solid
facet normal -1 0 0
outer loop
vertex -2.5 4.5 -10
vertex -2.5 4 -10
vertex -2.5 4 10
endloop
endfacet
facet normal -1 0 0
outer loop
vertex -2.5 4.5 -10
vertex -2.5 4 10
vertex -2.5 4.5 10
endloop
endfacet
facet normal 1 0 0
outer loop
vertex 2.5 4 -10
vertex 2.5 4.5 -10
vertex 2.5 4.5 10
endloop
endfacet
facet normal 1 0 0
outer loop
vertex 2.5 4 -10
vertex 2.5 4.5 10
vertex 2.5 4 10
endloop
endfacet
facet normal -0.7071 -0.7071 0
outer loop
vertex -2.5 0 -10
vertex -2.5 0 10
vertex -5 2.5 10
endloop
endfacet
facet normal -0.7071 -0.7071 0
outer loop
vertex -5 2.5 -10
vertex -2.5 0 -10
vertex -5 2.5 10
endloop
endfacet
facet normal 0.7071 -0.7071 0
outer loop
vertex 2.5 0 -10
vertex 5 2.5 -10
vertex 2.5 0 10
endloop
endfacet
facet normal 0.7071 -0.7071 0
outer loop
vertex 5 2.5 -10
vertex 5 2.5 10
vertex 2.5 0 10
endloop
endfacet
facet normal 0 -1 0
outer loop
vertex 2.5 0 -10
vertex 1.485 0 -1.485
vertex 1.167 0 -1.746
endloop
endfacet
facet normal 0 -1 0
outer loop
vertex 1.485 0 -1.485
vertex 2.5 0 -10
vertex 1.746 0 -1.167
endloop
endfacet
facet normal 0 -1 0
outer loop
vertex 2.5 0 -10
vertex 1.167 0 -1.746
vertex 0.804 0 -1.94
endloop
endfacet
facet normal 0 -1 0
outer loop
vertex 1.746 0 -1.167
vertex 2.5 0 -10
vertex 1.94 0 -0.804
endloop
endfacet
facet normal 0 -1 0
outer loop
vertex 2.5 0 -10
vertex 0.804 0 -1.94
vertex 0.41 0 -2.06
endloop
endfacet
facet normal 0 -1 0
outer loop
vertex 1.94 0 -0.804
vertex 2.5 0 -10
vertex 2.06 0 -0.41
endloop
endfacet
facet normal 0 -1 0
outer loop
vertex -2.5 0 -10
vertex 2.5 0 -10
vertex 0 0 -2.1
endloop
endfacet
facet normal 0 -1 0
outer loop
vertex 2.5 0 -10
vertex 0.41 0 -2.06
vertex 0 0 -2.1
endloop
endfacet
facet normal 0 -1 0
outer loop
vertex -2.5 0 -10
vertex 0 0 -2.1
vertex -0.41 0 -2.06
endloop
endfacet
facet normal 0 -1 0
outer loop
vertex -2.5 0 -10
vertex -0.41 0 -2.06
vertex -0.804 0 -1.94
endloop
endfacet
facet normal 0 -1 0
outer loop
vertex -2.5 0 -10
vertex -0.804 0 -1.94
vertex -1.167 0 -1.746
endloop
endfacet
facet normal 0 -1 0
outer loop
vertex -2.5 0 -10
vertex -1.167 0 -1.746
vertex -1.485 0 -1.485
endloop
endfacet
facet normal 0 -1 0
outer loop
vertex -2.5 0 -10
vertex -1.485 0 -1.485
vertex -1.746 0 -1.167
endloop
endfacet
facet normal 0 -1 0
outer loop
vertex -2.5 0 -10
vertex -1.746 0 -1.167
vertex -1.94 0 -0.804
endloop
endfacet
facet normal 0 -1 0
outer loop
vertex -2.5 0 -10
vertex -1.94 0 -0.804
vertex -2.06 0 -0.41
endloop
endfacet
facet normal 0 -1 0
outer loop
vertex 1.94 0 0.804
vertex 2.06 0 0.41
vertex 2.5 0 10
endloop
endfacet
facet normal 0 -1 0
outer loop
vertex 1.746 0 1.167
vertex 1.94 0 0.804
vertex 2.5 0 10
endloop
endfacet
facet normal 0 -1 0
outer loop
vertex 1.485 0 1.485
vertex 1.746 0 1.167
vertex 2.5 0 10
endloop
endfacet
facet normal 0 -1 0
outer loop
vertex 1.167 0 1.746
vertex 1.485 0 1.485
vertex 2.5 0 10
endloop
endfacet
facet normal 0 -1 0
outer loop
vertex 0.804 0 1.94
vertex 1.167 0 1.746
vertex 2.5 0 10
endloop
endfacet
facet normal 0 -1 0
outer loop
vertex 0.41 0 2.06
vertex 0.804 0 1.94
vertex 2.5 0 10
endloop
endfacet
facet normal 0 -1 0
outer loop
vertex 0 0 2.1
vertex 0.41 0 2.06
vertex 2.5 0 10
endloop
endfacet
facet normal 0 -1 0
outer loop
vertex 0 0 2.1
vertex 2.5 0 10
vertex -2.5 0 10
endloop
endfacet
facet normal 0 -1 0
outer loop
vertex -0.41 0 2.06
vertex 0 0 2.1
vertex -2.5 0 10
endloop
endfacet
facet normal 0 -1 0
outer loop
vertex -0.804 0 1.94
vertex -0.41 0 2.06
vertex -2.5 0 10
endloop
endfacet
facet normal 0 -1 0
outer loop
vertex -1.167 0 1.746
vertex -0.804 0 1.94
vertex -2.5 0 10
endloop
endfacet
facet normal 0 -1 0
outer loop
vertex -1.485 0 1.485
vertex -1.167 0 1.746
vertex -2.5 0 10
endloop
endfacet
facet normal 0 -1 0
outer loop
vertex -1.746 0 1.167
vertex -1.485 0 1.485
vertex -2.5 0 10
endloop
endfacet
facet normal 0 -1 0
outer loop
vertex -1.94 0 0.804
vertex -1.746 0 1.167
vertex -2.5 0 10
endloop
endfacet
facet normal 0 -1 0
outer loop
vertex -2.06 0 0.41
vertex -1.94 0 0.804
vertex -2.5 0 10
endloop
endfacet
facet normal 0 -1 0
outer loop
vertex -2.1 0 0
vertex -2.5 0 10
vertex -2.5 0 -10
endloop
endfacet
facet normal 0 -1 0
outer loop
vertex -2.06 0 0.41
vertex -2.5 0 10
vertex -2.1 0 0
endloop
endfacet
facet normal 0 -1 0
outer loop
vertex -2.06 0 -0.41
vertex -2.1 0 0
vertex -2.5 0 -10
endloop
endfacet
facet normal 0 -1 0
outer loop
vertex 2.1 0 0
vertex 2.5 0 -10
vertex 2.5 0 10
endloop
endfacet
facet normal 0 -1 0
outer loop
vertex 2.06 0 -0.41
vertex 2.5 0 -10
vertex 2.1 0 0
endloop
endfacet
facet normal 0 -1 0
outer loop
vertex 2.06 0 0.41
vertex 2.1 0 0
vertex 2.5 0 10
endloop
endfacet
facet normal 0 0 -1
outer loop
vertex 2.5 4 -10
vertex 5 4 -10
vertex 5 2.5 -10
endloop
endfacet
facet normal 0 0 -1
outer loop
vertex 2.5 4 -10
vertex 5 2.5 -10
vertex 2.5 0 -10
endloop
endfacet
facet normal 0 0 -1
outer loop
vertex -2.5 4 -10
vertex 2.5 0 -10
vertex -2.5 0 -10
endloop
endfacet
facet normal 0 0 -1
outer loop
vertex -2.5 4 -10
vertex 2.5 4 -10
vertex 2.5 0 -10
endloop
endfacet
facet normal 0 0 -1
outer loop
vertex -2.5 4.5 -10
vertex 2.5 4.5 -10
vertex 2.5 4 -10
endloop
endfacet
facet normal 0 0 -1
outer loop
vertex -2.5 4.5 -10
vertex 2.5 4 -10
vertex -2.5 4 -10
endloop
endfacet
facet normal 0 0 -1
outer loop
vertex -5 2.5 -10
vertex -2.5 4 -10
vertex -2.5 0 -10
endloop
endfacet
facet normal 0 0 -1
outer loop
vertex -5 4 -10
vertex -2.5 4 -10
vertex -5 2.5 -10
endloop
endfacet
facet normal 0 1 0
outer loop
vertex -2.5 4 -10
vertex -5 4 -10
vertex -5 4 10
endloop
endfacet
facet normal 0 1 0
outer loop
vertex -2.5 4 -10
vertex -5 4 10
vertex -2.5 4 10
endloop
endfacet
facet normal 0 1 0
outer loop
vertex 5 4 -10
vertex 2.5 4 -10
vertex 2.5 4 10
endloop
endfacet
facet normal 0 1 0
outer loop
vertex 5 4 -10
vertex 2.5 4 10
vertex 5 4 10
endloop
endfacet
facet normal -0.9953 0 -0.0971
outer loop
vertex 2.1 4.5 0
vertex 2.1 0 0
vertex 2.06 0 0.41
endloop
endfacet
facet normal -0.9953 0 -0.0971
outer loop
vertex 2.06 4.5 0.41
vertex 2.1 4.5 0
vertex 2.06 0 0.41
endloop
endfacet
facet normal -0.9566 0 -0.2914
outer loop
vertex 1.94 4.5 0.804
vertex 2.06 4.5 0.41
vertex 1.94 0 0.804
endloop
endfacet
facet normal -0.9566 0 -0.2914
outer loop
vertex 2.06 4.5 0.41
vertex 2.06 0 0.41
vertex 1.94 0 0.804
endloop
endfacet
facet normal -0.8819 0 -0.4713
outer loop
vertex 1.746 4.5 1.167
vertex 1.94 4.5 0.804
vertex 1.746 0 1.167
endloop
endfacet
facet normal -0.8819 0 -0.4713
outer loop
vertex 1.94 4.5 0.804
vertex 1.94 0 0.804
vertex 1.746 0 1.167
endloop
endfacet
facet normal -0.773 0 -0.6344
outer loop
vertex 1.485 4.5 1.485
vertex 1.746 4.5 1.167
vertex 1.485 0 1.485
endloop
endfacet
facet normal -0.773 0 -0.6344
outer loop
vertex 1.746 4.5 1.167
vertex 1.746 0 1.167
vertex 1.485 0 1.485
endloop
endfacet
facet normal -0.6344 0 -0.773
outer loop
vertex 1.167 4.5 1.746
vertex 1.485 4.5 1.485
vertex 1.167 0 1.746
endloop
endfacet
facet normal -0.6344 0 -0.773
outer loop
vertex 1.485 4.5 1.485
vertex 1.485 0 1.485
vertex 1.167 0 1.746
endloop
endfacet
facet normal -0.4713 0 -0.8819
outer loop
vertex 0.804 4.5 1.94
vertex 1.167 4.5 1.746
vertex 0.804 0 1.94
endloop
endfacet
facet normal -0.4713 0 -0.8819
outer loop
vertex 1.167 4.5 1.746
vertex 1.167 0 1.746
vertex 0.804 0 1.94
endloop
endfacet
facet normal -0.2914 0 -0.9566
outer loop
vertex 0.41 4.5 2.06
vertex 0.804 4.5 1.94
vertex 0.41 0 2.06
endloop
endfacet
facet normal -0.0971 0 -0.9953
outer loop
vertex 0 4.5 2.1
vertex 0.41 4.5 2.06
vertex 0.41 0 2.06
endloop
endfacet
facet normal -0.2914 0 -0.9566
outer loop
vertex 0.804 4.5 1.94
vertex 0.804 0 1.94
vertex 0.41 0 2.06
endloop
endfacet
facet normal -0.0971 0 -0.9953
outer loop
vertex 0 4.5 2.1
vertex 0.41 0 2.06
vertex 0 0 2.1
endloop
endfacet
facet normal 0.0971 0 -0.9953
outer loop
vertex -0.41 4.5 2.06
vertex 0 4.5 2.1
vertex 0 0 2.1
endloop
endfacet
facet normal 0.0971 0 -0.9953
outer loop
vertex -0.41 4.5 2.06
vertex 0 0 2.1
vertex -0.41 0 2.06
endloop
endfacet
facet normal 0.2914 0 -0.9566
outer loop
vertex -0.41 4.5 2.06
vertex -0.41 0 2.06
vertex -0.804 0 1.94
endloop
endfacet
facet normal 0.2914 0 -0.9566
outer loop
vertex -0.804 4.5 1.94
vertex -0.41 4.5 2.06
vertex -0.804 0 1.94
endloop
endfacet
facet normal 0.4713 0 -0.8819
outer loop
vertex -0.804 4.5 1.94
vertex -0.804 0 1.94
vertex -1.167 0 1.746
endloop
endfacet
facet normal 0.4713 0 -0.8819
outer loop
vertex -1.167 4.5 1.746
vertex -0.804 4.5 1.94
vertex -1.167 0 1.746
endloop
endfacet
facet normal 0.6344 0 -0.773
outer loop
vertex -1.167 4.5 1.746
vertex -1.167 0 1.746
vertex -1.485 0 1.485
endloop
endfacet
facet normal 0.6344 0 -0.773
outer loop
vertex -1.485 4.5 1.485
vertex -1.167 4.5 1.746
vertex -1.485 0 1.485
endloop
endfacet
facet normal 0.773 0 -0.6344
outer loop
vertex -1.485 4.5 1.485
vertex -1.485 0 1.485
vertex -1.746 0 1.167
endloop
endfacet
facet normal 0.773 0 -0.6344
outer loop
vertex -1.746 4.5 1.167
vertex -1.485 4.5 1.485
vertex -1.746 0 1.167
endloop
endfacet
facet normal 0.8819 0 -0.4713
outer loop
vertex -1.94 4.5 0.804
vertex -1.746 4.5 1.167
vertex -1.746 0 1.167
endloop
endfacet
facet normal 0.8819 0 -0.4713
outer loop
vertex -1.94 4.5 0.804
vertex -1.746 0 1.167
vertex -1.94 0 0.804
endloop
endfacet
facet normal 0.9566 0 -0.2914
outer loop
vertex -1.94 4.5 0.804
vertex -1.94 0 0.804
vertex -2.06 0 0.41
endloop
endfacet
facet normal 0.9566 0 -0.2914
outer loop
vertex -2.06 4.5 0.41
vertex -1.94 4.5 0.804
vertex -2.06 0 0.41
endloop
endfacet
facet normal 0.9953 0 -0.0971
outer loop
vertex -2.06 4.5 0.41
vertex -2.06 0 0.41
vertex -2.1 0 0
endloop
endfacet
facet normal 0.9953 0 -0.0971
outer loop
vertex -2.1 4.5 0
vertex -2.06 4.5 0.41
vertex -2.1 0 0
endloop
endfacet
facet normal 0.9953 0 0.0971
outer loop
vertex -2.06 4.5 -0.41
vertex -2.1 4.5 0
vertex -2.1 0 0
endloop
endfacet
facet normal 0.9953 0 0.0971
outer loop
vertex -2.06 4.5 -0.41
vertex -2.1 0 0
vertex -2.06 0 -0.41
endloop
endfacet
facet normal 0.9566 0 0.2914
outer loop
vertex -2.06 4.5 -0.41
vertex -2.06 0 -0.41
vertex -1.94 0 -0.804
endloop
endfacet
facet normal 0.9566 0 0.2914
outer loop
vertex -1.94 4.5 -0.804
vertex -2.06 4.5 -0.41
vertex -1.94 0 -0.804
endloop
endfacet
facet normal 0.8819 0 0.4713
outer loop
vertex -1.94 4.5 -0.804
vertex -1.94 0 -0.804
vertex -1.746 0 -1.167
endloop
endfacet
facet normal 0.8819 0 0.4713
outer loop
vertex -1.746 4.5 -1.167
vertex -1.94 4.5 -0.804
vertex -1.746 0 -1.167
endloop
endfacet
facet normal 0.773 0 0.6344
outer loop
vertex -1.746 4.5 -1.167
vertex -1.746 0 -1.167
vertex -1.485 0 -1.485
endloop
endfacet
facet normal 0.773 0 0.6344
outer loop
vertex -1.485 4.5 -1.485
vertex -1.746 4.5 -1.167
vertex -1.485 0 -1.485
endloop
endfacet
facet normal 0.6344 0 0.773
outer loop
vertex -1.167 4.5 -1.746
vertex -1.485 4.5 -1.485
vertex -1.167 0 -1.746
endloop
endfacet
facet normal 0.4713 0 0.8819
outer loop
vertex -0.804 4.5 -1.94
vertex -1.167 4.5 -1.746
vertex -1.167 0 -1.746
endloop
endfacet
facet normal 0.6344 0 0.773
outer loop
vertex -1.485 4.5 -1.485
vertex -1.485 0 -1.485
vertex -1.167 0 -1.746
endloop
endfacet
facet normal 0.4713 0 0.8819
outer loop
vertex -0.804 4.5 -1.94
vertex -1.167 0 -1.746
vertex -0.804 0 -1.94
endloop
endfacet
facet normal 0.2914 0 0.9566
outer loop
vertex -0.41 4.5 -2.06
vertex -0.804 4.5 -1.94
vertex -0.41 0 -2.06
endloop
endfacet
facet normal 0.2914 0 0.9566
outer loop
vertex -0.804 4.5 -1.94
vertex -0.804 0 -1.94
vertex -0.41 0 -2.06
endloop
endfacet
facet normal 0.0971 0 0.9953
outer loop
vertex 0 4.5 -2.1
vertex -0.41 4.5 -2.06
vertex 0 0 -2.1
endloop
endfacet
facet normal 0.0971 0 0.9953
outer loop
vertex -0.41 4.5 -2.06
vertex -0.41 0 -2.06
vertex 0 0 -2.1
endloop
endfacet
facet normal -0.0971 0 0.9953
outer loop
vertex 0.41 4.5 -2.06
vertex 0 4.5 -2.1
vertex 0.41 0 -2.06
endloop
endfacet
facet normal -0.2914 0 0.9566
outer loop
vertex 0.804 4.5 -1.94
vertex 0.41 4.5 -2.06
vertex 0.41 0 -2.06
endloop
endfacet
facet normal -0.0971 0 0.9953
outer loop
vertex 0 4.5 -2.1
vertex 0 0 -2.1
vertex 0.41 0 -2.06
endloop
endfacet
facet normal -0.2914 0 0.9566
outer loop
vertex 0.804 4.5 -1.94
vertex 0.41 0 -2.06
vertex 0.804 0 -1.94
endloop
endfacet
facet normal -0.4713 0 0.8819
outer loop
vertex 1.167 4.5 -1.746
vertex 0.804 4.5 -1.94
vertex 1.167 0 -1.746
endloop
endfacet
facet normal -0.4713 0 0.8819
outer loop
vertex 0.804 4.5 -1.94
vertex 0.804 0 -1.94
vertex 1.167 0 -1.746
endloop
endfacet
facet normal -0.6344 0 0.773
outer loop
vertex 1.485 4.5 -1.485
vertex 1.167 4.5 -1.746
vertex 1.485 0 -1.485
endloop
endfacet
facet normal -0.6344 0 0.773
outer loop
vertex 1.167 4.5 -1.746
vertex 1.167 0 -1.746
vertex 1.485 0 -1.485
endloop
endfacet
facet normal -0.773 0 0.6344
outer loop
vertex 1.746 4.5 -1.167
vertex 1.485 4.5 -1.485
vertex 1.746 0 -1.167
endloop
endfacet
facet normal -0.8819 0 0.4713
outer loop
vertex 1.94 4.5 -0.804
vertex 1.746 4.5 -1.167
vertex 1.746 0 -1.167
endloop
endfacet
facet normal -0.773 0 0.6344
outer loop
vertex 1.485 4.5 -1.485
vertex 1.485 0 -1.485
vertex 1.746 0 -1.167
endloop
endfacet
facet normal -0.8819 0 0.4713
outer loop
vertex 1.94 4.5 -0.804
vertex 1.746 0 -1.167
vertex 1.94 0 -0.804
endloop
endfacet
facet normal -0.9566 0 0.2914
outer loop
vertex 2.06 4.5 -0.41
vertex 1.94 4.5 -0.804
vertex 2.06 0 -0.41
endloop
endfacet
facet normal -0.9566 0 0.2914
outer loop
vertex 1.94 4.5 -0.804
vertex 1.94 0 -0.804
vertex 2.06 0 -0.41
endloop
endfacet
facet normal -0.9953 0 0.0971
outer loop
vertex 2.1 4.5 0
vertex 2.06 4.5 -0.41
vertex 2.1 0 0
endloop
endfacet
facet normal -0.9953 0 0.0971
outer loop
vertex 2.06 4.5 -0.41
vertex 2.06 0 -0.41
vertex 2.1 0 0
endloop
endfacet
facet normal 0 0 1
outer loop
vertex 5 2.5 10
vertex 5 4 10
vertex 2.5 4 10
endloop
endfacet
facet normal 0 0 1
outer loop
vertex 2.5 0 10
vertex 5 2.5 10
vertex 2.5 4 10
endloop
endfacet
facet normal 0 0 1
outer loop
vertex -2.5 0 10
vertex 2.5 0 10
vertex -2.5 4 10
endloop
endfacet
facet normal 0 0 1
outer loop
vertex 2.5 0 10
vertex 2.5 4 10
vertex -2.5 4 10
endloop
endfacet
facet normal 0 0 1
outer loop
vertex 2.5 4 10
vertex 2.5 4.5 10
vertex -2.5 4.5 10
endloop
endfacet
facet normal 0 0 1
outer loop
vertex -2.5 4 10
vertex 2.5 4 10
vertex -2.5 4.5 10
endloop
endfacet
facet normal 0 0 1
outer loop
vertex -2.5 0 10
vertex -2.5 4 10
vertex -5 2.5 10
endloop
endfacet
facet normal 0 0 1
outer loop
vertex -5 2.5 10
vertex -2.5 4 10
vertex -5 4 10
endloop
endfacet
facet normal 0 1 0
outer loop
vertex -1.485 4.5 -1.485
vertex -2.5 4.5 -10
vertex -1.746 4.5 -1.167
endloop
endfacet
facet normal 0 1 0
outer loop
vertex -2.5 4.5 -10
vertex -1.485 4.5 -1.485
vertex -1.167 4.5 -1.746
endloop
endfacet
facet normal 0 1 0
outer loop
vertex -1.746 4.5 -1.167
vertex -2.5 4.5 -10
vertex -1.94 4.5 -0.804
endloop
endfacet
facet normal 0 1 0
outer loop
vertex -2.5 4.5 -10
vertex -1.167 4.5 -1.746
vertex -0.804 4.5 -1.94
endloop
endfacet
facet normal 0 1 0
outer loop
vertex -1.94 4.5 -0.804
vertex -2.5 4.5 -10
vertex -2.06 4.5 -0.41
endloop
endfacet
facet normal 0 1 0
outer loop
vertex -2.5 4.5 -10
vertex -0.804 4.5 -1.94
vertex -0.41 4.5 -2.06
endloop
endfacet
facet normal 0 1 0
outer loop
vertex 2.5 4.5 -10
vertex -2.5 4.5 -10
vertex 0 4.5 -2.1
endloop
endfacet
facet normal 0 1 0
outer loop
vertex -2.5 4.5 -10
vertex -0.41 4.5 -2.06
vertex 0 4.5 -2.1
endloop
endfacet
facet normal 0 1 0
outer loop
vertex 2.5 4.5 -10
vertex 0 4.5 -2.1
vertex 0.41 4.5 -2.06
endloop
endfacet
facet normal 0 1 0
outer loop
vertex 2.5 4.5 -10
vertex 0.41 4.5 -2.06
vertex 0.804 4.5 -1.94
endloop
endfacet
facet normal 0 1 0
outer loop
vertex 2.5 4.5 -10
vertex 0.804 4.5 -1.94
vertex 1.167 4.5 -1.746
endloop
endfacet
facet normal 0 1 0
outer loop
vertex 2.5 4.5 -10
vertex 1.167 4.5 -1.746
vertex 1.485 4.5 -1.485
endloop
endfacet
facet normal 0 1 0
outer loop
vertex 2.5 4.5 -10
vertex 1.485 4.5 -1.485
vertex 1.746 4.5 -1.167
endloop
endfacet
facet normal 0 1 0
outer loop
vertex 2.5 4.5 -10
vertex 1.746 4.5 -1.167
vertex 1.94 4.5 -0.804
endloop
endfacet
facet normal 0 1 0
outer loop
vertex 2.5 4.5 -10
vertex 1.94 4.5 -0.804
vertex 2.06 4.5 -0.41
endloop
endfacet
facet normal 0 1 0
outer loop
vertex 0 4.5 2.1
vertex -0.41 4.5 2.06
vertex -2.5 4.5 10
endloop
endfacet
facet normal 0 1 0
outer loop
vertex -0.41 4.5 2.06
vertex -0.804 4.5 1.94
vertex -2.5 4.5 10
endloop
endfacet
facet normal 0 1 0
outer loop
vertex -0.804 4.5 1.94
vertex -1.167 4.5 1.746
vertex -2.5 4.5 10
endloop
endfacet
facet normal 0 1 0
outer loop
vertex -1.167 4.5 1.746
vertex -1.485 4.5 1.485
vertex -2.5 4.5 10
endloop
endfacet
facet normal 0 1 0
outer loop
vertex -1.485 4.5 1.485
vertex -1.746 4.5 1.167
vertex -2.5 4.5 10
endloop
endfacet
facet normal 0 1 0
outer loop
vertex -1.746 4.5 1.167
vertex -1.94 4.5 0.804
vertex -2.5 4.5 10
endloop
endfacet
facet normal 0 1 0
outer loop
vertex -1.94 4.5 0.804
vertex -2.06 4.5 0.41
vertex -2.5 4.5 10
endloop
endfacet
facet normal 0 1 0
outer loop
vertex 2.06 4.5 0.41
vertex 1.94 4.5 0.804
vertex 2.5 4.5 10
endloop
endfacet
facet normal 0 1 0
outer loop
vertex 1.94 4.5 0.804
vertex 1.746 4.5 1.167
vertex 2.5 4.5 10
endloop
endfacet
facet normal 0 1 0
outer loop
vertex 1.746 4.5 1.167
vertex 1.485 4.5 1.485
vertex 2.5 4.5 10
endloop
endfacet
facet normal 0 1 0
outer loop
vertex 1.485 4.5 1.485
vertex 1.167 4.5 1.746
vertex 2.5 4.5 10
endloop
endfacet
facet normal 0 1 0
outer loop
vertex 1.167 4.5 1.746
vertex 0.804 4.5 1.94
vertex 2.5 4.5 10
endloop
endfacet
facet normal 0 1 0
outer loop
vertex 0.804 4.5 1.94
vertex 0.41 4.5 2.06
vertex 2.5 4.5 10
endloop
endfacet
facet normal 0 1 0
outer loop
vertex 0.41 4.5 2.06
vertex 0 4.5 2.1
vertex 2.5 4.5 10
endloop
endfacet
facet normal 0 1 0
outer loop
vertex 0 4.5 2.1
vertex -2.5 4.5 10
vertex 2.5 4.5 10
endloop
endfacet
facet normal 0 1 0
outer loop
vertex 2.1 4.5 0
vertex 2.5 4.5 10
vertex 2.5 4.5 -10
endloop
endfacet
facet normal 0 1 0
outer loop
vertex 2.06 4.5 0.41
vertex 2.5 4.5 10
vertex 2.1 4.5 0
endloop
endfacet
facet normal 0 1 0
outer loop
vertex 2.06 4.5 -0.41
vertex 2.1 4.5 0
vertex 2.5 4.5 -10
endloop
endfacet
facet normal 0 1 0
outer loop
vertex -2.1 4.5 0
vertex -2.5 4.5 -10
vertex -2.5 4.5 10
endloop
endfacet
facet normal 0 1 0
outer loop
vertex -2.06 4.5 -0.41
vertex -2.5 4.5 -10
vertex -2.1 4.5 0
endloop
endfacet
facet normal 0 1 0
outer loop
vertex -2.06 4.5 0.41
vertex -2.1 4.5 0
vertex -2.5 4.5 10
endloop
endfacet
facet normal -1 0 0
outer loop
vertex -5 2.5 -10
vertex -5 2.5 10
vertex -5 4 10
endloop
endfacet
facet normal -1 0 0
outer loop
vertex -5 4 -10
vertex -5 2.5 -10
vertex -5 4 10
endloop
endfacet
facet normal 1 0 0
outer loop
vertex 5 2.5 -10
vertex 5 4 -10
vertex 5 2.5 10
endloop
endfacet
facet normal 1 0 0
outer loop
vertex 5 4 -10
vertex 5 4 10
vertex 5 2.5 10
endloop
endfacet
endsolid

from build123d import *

# Parameters (mm, degrees)
PAD_DEPTH    = 10
SKETCH001_R  = 2.1
POCKET_DEPTH = 5


with BuildPart() as part:
    # Sketch → Pad (new body, symmetric)
    with BuildSketch(Plane.XY):
        Polygon((-5, 4), (-2.5, 4), (-2.5, 4.5), (2.5, 4.5), (2.5, 4), (5, 4), (5, 2.5), (2.5, 0), (-2.5, 0), (-5, 2.5), align=None)
    extrude(amount=PAD_DEPTH, both=True)

    # Sketch001 → Pocket (cut)
    with BuildSketch(Plane.XZ):
        Circle(SKETCH001_R)
    extrude(amount=-POCKET_DEPTH, mode=Mode.SUBTRACT)


solid = part.part
